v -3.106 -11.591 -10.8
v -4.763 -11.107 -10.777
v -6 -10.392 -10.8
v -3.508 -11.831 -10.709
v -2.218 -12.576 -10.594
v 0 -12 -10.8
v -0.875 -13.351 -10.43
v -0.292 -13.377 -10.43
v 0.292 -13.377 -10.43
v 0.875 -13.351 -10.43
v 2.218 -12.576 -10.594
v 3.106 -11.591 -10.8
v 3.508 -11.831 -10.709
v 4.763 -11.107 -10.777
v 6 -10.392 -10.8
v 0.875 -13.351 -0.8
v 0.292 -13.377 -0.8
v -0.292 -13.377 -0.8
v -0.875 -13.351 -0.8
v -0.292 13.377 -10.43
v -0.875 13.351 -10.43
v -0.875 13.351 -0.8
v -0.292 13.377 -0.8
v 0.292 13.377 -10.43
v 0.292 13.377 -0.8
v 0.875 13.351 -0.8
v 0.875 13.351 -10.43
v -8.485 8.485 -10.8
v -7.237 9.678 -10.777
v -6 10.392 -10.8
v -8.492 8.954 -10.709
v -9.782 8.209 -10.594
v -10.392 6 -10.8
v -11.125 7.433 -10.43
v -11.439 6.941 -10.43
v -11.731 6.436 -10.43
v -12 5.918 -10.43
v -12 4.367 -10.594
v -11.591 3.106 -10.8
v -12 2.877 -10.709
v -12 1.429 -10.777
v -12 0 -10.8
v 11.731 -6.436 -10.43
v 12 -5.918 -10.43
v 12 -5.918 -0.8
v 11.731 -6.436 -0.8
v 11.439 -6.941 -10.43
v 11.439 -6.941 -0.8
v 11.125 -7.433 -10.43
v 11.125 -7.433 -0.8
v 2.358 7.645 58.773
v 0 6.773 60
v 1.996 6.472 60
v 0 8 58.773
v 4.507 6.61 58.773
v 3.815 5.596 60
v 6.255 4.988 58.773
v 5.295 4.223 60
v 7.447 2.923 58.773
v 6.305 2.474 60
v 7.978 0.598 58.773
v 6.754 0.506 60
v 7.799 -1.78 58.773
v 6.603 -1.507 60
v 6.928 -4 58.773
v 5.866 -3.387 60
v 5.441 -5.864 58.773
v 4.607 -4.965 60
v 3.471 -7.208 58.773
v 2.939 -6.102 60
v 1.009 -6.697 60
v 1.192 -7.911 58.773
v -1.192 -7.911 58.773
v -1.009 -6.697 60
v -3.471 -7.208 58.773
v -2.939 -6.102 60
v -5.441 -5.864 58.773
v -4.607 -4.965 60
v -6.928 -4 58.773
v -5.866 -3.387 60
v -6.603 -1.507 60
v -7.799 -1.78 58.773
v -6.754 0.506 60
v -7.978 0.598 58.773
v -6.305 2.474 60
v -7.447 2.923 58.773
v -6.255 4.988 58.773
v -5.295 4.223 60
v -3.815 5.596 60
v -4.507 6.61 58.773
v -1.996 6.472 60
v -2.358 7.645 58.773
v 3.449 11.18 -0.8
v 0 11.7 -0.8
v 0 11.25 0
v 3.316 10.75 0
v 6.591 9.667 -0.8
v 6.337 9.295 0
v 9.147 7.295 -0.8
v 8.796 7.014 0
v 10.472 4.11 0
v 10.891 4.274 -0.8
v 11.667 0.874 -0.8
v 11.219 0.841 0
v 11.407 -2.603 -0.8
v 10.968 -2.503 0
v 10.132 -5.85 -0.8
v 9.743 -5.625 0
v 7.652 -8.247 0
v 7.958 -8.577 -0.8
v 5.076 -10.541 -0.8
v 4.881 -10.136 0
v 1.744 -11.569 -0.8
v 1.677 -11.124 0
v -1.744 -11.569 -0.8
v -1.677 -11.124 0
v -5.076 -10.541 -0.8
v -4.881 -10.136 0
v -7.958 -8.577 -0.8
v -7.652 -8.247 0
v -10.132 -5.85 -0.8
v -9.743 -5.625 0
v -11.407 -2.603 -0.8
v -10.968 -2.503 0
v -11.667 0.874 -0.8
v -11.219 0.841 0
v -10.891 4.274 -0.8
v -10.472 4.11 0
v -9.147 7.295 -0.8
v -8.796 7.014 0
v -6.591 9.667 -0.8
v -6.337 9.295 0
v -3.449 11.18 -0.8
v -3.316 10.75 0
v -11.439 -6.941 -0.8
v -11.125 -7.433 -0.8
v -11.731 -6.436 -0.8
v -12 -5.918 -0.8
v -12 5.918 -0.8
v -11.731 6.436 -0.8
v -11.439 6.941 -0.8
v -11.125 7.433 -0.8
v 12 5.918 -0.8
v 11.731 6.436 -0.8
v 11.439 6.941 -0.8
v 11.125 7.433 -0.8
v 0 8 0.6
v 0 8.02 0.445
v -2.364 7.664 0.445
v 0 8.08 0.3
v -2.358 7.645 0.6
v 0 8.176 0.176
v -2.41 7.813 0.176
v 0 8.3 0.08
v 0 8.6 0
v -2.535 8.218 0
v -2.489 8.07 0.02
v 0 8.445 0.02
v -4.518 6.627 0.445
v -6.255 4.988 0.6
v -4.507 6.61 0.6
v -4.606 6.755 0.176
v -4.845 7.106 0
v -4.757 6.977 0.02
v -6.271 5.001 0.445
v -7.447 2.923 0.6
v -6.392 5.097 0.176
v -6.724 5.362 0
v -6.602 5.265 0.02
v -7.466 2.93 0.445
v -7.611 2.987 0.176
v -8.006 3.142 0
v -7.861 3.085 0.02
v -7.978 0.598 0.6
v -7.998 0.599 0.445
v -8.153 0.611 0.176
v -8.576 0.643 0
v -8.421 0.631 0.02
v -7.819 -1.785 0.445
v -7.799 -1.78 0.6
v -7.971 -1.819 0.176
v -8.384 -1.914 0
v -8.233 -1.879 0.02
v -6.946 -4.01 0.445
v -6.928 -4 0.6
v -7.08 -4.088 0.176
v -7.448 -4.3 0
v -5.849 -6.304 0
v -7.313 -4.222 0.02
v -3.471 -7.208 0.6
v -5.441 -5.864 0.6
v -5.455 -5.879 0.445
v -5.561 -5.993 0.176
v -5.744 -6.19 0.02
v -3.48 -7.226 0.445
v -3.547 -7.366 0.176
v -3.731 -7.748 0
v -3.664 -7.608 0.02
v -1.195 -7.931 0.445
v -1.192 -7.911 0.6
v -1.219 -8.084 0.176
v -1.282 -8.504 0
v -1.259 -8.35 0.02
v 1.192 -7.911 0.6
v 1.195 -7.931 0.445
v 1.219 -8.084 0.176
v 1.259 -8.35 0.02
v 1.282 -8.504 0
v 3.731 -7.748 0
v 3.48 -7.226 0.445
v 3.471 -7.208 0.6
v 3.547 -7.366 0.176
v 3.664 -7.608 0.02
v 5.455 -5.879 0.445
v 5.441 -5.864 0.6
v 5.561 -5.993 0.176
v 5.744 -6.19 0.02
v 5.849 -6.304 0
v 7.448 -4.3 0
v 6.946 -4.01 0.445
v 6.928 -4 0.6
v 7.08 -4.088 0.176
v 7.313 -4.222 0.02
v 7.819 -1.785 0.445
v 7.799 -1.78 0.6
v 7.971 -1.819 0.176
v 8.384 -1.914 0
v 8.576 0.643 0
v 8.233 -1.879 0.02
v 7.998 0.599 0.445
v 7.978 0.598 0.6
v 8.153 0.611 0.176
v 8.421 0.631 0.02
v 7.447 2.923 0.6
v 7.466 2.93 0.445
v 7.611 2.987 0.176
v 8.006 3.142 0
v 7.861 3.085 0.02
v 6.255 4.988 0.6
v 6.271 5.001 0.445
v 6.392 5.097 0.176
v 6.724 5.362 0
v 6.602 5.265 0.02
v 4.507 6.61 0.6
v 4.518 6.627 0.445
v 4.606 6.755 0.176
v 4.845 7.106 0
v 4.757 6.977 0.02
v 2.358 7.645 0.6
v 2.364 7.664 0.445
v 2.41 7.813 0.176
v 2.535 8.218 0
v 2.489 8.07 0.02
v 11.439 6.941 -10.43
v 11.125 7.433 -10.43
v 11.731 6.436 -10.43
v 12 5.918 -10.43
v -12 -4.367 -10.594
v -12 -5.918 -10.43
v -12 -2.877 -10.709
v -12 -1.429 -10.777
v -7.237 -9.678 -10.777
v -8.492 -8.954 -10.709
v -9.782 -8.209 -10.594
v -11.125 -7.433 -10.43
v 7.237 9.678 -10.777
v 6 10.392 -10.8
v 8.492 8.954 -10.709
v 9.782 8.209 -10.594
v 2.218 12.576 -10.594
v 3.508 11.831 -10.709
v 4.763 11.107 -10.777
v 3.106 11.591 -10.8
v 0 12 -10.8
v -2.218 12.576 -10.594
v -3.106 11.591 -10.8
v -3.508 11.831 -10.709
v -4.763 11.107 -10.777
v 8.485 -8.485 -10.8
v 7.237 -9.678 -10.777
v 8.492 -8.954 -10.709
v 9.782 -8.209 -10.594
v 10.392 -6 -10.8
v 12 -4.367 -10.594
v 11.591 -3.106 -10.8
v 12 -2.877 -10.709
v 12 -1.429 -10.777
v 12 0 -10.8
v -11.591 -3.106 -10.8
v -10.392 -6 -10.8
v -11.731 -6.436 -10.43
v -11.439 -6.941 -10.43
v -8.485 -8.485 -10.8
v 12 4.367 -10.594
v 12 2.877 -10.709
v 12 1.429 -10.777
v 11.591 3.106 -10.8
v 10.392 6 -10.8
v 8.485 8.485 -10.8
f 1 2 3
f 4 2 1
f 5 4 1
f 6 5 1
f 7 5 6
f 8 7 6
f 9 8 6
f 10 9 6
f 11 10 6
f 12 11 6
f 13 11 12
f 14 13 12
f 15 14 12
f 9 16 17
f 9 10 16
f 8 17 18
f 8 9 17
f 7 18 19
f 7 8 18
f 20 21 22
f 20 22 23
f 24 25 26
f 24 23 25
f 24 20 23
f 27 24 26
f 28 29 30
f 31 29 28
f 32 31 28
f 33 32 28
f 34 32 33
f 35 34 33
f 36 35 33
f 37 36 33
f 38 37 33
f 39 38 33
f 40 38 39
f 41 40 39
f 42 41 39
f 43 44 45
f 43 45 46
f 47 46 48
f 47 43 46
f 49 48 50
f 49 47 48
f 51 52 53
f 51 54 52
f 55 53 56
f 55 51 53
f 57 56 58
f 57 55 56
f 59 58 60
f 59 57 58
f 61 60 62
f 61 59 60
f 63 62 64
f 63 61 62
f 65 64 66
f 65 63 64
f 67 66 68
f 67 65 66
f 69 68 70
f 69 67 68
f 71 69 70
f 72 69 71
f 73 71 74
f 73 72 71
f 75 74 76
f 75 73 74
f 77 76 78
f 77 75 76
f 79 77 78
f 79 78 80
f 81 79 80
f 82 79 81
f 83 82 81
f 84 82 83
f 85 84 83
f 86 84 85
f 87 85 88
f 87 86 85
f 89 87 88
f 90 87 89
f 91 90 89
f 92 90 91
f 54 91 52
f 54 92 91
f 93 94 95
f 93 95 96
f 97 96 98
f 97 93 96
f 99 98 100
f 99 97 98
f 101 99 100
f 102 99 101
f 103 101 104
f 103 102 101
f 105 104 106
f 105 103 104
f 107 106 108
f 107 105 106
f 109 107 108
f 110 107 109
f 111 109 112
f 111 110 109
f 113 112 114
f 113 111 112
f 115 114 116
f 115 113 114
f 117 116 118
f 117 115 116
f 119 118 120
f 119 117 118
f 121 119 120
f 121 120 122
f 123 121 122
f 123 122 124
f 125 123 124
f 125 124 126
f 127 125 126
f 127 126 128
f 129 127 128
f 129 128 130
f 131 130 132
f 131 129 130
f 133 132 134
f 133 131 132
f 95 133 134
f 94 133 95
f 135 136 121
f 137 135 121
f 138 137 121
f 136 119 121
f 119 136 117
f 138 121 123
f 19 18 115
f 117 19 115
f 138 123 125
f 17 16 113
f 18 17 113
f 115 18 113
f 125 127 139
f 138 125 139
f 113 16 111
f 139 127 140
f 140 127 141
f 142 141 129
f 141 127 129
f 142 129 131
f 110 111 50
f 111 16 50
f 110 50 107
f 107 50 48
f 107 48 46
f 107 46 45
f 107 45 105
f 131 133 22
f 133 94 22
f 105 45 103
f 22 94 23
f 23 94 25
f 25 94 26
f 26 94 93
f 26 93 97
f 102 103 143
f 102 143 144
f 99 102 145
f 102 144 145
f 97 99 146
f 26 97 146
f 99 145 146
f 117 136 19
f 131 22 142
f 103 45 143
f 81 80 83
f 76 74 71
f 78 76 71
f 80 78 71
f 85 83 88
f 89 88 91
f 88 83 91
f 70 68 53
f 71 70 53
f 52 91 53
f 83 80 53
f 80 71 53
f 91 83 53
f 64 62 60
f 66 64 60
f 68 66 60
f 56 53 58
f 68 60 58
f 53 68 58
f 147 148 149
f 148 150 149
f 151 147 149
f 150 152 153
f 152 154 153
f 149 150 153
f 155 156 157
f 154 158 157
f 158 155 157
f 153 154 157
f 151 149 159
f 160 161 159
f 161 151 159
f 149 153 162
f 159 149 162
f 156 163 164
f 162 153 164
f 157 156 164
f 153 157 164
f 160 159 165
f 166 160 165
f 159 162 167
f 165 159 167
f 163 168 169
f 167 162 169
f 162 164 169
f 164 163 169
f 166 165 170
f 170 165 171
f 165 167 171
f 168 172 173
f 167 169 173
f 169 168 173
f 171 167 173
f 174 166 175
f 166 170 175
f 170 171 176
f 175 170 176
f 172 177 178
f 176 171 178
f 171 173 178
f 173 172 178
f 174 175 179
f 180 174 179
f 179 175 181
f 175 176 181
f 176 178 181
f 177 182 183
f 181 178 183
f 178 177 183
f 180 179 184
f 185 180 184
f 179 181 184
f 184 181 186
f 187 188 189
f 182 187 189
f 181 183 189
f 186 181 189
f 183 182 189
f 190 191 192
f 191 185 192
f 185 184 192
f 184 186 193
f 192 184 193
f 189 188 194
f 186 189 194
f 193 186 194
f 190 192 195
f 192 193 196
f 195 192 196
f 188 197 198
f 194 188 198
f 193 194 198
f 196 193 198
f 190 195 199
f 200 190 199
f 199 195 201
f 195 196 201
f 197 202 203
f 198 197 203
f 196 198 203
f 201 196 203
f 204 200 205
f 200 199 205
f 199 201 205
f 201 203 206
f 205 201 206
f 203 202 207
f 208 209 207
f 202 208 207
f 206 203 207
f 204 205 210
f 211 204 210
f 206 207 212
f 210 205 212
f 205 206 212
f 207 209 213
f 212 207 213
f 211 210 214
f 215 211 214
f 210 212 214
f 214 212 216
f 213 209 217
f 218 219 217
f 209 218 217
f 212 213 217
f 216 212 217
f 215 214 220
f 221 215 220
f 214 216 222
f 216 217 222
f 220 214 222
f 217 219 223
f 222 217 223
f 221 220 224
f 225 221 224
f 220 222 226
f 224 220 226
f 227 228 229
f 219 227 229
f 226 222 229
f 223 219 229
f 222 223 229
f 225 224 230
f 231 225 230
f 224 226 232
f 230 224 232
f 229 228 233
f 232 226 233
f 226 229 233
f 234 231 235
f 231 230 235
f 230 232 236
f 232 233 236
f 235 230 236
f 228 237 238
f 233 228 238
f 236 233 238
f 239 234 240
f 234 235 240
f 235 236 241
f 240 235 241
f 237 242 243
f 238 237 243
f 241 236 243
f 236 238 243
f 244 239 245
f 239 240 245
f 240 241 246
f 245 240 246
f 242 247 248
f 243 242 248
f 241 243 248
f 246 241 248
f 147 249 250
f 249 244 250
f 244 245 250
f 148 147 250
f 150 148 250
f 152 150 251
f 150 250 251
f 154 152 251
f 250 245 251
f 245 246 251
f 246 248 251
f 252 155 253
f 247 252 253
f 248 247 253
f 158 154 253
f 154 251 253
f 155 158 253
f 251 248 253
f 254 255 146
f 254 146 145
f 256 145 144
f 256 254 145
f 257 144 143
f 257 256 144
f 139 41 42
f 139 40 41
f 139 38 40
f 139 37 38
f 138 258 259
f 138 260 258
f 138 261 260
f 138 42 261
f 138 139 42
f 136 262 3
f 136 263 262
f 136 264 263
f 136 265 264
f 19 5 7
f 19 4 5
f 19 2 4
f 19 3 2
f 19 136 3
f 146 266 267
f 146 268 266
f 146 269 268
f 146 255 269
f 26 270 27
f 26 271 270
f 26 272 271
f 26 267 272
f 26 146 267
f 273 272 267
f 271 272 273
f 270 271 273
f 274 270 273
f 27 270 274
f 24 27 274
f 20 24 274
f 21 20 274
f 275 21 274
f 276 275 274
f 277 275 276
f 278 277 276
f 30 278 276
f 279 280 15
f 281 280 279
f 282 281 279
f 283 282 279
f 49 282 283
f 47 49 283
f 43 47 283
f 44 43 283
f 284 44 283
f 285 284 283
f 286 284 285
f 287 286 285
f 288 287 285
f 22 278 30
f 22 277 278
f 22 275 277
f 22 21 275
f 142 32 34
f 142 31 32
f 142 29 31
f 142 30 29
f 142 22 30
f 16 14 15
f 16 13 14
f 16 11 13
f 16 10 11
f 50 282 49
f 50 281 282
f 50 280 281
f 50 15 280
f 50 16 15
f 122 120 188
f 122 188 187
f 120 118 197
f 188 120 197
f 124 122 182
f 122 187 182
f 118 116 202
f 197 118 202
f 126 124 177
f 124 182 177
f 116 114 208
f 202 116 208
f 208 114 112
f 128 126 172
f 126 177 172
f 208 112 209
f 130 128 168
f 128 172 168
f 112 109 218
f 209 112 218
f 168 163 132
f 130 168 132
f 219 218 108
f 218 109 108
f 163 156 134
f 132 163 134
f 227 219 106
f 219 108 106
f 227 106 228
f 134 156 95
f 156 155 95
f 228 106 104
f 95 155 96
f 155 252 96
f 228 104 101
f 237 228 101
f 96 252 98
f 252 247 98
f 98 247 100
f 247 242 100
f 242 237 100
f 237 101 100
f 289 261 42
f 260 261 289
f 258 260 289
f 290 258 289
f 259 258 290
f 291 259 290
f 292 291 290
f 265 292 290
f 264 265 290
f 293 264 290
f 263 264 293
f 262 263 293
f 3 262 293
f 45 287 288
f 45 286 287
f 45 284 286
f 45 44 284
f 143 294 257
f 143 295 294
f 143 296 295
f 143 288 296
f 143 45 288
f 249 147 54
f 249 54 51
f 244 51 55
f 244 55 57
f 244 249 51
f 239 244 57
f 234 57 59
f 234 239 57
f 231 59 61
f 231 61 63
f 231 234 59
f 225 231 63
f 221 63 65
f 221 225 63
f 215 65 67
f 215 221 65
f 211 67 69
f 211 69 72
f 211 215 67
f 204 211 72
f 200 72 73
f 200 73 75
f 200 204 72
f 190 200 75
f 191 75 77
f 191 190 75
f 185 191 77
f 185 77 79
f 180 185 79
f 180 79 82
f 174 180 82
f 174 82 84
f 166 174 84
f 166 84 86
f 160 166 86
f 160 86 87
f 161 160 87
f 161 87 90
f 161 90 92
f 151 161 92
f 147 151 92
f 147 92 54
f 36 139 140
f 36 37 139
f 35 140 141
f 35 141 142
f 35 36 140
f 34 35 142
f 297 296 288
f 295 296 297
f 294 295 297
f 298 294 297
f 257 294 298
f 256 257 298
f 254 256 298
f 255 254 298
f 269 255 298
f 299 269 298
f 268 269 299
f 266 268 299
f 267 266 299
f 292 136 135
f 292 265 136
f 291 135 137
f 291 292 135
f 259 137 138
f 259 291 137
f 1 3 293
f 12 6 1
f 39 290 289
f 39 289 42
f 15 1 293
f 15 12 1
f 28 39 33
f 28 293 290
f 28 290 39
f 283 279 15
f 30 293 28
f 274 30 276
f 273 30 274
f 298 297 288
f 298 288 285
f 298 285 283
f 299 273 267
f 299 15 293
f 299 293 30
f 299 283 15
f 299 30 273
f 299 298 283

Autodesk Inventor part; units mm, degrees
sketch "Sketch_3" plane through (0, 0, 0) normal (1, 0, 0) x (0, 0, -1)
  line L0 (10.8, 0) -> (-60, 0)
  line L1 (-60, 0) -> (-60, 6.773)
  line L2 (-60, 6.773) -> (-58.773, 8)
  line L3 (-58.773, 8) -> (-0.6, 8)
  arc A0 (-0.6, 8) -> (0, 8.6) centre (-0.6, 8.6) ccw
  line L4 (0, 8.6) -> (0, 11.25)
  line L5 (0, 11.25) -> (0.8, 11.7)
  line L6 (0.8, 11.7) -> (0.8, 13.38)
  line L7 (0.8, 13.38) -> (10.4302, 13.38)
  line L8 (10.4302, 13.38) -> (10.8, 12)
  line L9 (10.8, 12) -> (10.8, 0)
  line L10 (10.8, 0) -> (-60, 0)
revolve "Revolution1" add sketch "Sketch_3" angle 360 about axis through (0, 0, -10.8) along (0, 0, -1)
thread "Thread1" size "M16x2" class "6g" standard "ISO Metric profile" length 57.8748 offset 1.5252
sketch "Sketch_1" plane through (0, 0, 0) normal (0, 0, 1) x (1, 0, 0)
  line L0 (-24, -24) -> (24, -24)
  line L1 (24, -24) -> (24, 24)
  line L2 (24, 24) -> (-24, 24)
  line L3 (-24, 24) -> (-24, -24)
  line L4 (-12, -6.9282) -> (0, -13.8564)
  line L5 (0, -13.8564) -> (12, -6.9282)
  line L6 (12, -6.9282) -> (12, 6.9282)
  line L7 (12, 6.9282) -> (0, 13.8564)
  line L8 (0, 13.8564) -> (-12, 6.9282)
  line L9 (-12, 6.9282) -> (-12, -6.9282)
extrude "Extrusion1" cut sketch "Sketch_1" against normal blind 10.8
ref_plane "DP402_XY" through (0, 6.773, 60) normal (1, 0, 0) x (0, 0, -1)
ref_plane "DP402_YZ" through (0, 6.773, 60) normal (0, 0, -1) x (0, 1, 0)
ref_plane "DP402_ZX" through (0, 6.773, 60) normal (0, 1, 0) x (1, 0, 0)
ref_plane "DPG1_XY" through (0, 8, 58.773) normal (1, 0, 0) x (0, 0, -1)
ref_plane "DPG1_YZ" through (0, 8, 58.773) normal (0, 0, -1) x (0, 1, 0)
ref_plane "DPG1_ZX" through (0, 8, 58.773) normal (0, 1, 0) x (1, 0, 0)
ref_plane "DPG2_XY" through (0, -8, 58.773) normal (1, 0, 0) x (0, 0, -1)
ref_plane "DPG2_YZ" through (0, -8, 58.773) normal (0, 0, -1) x (0, 1, 0)
ref_plane "DPG2_ZX" through (0, -8, 58.773) normal (0, 1, 0) x (1, 0, 0)
ref_plane "SCHRAUBE_XY" through (0, 0, 0) normal (0, 0, -1) x (1, 0, 0)
ref_plane "SCHRAUBE_YZ" through (0, 0, 0) normal (1, 0, 0) x (0, -1, 0)
ref_plane "SCHRAUBE_ZX" through (0, 0, 0) normal (0, -1, 0) x (0, 0, -1)
properties part number "SLZ_63_Schraube_M16x60#"
